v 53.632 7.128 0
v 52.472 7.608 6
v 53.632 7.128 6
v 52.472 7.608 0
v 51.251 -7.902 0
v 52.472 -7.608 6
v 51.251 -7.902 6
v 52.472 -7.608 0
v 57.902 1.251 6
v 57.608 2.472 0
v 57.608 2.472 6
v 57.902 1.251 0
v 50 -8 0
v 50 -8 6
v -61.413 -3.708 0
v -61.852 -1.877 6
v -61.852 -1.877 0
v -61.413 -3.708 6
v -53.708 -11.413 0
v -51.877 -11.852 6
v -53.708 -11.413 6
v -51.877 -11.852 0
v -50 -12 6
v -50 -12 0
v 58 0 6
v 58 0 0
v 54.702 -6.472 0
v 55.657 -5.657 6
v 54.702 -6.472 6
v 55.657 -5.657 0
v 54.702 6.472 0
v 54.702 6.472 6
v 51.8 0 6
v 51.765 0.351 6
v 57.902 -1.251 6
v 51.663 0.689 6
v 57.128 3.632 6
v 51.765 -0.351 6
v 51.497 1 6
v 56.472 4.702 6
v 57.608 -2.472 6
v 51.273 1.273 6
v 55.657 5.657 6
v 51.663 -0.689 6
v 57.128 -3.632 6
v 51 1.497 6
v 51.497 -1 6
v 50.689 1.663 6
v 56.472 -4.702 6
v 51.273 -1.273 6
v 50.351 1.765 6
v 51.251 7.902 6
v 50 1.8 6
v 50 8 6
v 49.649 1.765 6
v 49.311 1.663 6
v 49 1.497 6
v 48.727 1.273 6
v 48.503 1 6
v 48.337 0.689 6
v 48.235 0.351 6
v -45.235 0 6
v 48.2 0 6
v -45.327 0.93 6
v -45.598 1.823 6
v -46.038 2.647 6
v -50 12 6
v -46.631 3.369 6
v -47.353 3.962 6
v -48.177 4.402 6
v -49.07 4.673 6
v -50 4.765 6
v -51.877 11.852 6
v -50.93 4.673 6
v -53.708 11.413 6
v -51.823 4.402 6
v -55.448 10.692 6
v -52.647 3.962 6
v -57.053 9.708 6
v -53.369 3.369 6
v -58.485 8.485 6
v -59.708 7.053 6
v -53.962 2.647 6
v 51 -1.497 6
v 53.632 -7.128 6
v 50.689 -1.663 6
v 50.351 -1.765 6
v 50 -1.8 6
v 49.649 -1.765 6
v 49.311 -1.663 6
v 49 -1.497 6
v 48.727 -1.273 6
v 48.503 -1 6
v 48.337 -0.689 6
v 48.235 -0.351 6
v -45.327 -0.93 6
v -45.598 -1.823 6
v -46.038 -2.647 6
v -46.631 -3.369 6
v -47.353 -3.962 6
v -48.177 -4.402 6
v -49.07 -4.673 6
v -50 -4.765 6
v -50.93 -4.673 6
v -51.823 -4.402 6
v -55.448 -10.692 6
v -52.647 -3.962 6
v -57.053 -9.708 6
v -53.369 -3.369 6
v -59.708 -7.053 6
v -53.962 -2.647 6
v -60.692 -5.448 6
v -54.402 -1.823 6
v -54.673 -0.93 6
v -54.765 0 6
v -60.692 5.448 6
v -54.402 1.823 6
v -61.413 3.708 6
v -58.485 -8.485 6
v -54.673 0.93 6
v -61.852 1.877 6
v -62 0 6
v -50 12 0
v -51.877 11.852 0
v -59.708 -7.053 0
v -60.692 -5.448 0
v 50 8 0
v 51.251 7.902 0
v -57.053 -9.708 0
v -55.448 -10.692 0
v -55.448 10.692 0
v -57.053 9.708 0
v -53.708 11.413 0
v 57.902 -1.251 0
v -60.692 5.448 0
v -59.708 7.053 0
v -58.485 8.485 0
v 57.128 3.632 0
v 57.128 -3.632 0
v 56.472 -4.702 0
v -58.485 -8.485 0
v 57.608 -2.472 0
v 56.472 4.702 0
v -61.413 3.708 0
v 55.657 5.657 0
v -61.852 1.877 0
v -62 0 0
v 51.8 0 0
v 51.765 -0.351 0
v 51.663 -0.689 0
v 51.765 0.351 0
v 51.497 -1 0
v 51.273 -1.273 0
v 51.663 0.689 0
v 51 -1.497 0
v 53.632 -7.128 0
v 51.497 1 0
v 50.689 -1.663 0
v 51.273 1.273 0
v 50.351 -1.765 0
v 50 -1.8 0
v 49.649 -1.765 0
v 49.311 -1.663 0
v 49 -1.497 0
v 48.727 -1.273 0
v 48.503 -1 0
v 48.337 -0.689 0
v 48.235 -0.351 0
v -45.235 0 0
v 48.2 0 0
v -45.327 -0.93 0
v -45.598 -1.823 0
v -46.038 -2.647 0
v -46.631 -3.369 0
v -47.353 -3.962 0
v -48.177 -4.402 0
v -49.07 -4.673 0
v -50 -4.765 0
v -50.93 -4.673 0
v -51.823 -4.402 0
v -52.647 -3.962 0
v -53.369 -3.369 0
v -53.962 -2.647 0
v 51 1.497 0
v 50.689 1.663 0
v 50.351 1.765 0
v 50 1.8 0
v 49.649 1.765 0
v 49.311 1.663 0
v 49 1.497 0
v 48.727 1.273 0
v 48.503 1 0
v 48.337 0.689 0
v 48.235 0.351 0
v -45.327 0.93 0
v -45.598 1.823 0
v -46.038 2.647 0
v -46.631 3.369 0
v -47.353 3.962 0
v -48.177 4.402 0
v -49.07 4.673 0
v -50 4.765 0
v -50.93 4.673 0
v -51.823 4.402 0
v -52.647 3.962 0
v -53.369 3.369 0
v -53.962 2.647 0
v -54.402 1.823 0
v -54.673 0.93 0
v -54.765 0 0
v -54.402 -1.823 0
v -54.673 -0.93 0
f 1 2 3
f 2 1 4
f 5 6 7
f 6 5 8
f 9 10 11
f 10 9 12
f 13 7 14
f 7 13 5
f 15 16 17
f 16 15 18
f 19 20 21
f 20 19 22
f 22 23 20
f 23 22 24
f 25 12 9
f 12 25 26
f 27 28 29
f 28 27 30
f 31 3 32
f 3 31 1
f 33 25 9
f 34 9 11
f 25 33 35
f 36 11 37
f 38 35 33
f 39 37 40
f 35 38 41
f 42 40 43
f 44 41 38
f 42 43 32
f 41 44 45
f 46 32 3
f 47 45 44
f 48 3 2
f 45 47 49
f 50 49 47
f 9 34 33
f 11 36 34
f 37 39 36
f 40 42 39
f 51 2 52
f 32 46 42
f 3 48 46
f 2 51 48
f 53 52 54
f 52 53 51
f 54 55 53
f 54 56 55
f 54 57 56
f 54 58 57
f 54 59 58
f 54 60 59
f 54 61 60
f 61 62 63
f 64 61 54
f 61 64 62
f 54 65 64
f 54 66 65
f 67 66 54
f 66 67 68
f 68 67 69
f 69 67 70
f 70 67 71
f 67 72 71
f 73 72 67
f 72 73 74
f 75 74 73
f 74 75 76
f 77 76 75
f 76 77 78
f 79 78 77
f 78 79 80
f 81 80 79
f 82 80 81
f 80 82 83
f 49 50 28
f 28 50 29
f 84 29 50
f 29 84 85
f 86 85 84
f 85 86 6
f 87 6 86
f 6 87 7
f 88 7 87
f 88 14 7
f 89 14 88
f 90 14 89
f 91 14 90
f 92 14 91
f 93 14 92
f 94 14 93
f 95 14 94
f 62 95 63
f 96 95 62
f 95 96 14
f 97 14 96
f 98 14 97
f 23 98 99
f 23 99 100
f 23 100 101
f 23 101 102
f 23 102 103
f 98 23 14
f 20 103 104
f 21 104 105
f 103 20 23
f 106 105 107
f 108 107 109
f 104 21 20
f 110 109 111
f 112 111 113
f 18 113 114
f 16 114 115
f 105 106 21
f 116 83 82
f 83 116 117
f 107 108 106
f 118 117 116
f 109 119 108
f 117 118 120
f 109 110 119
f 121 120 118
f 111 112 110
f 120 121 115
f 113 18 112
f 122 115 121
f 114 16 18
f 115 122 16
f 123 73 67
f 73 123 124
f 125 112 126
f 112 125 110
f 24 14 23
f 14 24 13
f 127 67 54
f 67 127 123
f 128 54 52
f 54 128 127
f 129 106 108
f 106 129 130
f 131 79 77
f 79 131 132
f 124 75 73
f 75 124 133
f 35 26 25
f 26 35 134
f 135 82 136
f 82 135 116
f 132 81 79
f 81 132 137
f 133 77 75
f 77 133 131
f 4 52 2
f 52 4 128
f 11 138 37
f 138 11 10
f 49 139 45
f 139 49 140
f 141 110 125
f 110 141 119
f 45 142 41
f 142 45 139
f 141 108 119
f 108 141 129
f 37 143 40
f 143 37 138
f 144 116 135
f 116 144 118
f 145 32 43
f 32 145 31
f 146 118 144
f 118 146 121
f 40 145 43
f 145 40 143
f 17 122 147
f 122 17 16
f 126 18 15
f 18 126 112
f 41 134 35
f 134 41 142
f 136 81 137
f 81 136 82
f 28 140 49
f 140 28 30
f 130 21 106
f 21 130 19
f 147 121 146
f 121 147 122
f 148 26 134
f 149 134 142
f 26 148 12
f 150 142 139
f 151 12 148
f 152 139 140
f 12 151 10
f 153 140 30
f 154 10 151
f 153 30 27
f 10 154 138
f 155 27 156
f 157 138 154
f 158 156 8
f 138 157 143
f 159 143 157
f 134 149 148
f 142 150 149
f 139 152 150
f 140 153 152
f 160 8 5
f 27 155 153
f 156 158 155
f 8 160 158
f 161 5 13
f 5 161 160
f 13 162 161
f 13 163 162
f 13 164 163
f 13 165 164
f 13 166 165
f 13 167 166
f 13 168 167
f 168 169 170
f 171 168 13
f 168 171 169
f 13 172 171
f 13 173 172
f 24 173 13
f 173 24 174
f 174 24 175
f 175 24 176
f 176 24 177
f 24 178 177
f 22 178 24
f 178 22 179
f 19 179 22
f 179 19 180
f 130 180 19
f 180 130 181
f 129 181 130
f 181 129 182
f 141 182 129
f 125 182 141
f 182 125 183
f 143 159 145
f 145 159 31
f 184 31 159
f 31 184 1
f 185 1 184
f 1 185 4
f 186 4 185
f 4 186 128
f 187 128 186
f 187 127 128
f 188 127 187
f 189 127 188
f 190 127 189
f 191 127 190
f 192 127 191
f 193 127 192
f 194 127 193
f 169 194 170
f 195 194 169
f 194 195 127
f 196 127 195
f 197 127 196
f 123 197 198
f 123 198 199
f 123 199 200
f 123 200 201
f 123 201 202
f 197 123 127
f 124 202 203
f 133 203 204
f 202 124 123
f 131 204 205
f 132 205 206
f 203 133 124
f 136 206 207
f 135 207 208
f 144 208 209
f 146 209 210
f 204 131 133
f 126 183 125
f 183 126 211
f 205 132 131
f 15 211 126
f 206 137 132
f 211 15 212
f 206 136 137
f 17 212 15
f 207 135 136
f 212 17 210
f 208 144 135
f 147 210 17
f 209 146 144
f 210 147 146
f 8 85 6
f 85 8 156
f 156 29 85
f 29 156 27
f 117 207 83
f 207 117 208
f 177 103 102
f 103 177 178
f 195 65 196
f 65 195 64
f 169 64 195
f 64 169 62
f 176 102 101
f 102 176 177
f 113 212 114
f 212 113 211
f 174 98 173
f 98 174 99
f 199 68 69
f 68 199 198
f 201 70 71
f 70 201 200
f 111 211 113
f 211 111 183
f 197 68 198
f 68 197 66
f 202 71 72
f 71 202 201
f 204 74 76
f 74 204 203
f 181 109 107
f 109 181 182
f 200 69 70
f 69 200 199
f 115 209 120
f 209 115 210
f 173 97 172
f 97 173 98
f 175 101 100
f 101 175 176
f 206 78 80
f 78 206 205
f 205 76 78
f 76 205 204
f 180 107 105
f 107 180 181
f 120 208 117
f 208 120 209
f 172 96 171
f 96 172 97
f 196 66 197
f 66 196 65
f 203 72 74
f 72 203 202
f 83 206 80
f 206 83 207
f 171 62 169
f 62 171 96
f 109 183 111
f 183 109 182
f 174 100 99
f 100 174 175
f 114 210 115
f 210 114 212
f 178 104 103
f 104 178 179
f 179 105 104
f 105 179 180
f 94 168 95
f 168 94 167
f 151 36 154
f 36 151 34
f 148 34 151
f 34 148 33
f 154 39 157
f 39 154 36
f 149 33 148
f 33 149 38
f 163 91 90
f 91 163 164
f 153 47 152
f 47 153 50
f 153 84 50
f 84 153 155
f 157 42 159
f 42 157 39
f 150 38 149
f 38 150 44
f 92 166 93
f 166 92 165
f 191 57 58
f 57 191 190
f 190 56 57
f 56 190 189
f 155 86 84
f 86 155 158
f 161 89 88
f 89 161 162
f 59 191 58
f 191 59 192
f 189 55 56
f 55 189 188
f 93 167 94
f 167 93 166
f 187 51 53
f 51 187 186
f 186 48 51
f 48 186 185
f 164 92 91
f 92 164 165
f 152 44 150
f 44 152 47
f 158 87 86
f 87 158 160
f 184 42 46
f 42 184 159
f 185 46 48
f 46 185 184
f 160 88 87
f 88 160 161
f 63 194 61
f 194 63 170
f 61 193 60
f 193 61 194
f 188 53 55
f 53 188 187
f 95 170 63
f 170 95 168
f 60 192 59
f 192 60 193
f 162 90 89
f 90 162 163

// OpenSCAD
$fn = 32;

// ----------------------------------------------------------------------
// Lever: 100 mm between the bosses, 6 mm thick, smooth outline
// ----------------------------------------------------------------------

// --- parameters (mm) ---
lever_l = 100;            // distance between the boss centres
boss_a = 24;              // first boss diameter
boss_b = 16;              // second boss diameter
bore_a = 9.53;            // first bore
bore_b = 3.6;             // second bore
lever_t = 6;              // lever thickness

lever_profile = [[-62, 0], [-61.852, -1.877], [-61.413, -3.708], [-60.692, -5.448], [-59.708, -7.053], [-58.485, -8.485], [-57.053, -9.708], [-55.448, -10.692], [-53.708, -11.413], [-51.877, -11.852], [-50, -12], [50, -8], [51.251, -7.902], [52.472, -7.608], [53.632, -7.128], [54.702, -6.472], [55.657, -5.657], [56.472, -4.702], [57.128, -3.632], [57.608, -2.472], [57.902, -1.251], [58, 0], [57.902, 1.251], [57.608, 2.472], [57.128, 3.632], [56.472, 4.702], [55.657, 5.657], [54.702, 6.472], [53.632, 7.128], [52.472, 7.608], [51.251, 7.902], [50, 8], [-50, 12], [-51.877, 11.852], [-53.708, 11.413], [-55.448, 10.692], [-57.053, 9.708], [-58.485, 8.485], [-59.708, 7.053], [-60.692, 5.448], [-61.413, 3.708], [-61.852, 1.877]];

difference() {
  linear_extrude(height = lever_t) polygon(lever_profile);
  translate([-50, 0, -2.5]) cylinder(h = lever_t + 5, d = bore_a);
  translate([50, 0, -2.5]) cylinder(h = lever_t + 5, d = bore_b);
}
